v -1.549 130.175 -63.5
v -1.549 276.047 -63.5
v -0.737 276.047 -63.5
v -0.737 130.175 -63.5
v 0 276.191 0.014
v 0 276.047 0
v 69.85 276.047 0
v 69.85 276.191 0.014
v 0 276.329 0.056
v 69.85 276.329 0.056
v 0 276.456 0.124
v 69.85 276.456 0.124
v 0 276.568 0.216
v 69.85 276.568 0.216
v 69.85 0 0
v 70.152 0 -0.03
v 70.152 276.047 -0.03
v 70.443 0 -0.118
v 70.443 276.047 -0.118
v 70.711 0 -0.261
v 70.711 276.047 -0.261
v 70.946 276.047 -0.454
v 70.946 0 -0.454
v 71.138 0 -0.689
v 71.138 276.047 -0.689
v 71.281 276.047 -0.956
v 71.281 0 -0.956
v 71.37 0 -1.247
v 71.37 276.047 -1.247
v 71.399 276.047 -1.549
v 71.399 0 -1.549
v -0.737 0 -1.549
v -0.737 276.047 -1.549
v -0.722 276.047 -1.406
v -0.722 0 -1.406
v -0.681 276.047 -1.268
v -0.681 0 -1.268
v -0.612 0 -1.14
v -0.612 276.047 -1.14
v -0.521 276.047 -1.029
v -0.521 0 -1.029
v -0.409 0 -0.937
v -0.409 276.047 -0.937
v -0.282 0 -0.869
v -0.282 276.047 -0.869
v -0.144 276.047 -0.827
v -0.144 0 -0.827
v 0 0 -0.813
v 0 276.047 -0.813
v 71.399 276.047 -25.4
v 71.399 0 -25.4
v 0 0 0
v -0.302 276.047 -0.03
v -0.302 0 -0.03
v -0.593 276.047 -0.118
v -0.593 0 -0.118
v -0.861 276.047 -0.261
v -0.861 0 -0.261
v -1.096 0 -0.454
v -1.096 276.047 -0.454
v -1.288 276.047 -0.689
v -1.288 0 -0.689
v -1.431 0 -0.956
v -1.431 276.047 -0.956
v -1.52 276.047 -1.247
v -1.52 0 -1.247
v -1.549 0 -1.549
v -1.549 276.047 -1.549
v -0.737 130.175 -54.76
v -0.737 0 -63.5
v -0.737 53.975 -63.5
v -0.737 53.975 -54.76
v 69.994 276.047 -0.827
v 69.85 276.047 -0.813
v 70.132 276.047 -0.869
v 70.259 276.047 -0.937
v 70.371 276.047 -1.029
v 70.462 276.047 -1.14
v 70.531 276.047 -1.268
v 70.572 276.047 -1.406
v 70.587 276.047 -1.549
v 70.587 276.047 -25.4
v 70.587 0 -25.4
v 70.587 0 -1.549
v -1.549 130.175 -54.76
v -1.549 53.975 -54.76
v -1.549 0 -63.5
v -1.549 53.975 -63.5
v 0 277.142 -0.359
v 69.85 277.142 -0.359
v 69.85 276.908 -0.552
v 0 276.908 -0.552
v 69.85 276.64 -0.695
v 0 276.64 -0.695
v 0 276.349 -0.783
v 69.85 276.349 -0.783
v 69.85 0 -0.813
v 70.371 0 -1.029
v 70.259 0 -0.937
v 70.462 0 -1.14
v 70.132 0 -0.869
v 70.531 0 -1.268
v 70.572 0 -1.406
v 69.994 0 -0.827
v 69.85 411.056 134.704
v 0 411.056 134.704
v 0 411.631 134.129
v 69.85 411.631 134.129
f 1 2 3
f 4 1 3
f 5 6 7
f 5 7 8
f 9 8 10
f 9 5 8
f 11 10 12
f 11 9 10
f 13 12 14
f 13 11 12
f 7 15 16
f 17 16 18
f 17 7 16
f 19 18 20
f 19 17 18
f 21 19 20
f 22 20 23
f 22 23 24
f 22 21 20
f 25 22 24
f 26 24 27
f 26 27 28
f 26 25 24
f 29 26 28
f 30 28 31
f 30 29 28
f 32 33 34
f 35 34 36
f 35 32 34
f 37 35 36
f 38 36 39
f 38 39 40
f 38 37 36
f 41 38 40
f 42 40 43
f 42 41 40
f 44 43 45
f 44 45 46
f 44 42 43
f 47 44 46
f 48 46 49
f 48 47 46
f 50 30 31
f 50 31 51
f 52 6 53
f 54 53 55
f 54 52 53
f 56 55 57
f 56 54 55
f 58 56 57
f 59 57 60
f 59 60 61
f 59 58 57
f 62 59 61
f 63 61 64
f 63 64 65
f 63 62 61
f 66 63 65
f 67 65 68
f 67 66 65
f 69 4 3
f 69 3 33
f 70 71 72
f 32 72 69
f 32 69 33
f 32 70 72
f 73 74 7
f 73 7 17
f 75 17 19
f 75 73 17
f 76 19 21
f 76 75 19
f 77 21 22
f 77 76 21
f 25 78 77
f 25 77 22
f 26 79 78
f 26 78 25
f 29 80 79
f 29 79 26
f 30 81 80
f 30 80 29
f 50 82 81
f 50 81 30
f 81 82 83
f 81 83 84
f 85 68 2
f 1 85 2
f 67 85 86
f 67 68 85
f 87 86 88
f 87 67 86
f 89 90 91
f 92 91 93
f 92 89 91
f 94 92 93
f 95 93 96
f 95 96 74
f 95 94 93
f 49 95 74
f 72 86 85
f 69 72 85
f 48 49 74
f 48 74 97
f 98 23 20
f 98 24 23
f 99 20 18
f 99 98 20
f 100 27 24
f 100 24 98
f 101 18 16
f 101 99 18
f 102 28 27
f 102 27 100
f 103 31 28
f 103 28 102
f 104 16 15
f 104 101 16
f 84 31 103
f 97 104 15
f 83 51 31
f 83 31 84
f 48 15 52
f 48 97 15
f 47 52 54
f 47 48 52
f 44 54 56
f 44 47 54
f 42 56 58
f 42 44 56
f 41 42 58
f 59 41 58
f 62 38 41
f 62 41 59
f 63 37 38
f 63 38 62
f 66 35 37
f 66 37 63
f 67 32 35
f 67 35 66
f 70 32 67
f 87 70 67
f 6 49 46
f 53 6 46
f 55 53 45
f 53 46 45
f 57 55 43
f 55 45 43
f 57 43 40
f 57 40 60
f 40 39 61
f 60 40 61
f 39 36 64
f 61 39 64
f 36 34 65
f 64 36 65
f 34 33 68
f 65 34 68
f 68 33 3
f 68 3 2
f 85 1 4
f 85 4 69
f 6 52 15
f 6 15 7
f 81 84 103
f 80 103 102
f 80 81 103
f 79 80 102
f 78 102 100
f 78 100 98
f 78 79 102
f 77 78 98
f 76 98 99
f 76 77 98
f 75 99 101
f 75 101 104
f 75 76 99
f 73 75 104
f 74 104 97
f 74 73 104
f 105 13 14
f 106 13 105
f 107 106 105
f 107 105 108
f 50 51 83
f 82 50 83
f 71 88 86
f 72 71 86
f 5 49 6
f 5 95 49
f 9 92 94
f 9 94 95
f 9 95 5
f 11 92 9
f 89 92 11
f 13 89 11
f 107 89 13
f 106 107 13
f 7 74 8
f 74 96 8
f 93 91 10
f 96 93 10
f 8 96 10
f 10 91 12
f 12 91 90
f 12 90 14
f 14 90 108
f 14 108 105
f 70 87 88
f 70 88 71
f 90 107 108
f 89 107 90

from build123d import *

# Parameters (mm, degrees)
BASE_FLANGE1_DEPTH = 69.85
EDGE_FLANGE1_DEPTH = 276.04689029
EDGE_FLANGE3_DEPTH = 276.04689029
CUT_EXTRUDE1_REACH = 441.211
SKETCH16_W         = 8.739840912
SKETCH16_H         = 76.2


# Sheet-metal steps are written as plain solids
with BuildPart() as part:
    # Sketch1 → Base-Flange1 (new body)
    with BuildSketch(Plane(origin=(0, 0, 0), x_dir=(0, 0, -1), z_dir=(1, 0, 0))):
        with BuildLine():
            Line((0, 0), (0, 276.04689029))
            ThreePointArc((0, 276.04689029), (-0.056070336, 276.328774906), (-0.215745145, 276.567745145))
            Line((-0.215745145, 276.567745145), (-134.703841816, 411.055841816))
            Line((-134.703841816, 411.055841816), (-134.129105424, 411.630578208))
            Line((-134.129105424, 411.630578208), (0.358991247, 277.142481537))
            ThreePointArc((0.358991247, 277.142481537), (0.694858948, 276.63982), (0.8128, 276.04689029))
            Line((0.8128, 276.04689029), (0.8128, 0))
            Line((0.8128, 0), (0, 0))
        make_face()
    extrude(amount=BASE_FLANGE1_DEPTH)

    # Edge-Flange1 section (across the edge) → Edge-Flange1 (add)
    with BuildSketch(Plane(origin=(70.5866, 276.04689029, -0.8128), x_dir=(-1, 0, 0), z_dir=(0, -1, 0))):
        with BuildLine():
            Line((-0.8128, 0.7366), (-0.8128, 24.5872))
            Line((-0.8128, 24.5872), (0, 24.5872))
            Line((0, 24.5872), (0, 0.7366))
            ThreePointArc((0, 0.7366), (0.215745145, 0.215745145), (0.7366, 0))
            Line((0.7366, 0), (0.7366, -0.8128))
            ThreePointArc((0.7366, -0.8128), (-0.358991247, -0.358991247), (-0.8128, 0.7366))
        make_face()
    extrude(amount=EDGE_FLANGE1_DEPTH)

    # Edge-Flange3 section (across the edge) → Edge-Flange3 (add)
    with BuildSketch(Plane(origin=(-0.7366, 0, -0.8128), x_dir=(1, 0, 0), z_dir=(0, 1, 0))):
        with BuildLine():
            Line((-0.8128, 0.7366), (-0.8128, 62.6872))
            Line((-0.8128, 62.6872), (0, 62.6872))
            Line((0, 62.6872), (0, 0.7366))
            ThreePointArc((0, 0.7366), (0.215745145, 0.215745145), (0.7366, 0))
            Line((0.7366, 0), (0.7366, -0.8128))
            ThreePointArc((0.7366, -0.8128), (-0.358991247, -0.358991247), (-0.8128, 0.7366))
        make_face()
    extrude(amount=EDGE_FLANGE3_DEPTH)

    # Sketch16 → Cut-Extrude1 (cut, up to next)
    with BuildSketch(Plane.ZY.offset(1.5494), mode=Mode.PRIVATE) as cut_extrude1_sk1:
        with Locations((-59.130079544, 92.075)):
            Rectangle(SKETCH16_W, SKETCH16_H)
    cut_extrude1_tool1 = extrude(cut_extrude1_sk1.sketch, amount=-CUT_EXTRUDE1_REACH, mode=Mode.PRIVATE) & part.part
    add(cut_extrude1_tool1.solids().sort_by_distance((-1.5494, 92.075, -59.13008))[0], mode=Mode.SUBTRACT)


solid = part.part
